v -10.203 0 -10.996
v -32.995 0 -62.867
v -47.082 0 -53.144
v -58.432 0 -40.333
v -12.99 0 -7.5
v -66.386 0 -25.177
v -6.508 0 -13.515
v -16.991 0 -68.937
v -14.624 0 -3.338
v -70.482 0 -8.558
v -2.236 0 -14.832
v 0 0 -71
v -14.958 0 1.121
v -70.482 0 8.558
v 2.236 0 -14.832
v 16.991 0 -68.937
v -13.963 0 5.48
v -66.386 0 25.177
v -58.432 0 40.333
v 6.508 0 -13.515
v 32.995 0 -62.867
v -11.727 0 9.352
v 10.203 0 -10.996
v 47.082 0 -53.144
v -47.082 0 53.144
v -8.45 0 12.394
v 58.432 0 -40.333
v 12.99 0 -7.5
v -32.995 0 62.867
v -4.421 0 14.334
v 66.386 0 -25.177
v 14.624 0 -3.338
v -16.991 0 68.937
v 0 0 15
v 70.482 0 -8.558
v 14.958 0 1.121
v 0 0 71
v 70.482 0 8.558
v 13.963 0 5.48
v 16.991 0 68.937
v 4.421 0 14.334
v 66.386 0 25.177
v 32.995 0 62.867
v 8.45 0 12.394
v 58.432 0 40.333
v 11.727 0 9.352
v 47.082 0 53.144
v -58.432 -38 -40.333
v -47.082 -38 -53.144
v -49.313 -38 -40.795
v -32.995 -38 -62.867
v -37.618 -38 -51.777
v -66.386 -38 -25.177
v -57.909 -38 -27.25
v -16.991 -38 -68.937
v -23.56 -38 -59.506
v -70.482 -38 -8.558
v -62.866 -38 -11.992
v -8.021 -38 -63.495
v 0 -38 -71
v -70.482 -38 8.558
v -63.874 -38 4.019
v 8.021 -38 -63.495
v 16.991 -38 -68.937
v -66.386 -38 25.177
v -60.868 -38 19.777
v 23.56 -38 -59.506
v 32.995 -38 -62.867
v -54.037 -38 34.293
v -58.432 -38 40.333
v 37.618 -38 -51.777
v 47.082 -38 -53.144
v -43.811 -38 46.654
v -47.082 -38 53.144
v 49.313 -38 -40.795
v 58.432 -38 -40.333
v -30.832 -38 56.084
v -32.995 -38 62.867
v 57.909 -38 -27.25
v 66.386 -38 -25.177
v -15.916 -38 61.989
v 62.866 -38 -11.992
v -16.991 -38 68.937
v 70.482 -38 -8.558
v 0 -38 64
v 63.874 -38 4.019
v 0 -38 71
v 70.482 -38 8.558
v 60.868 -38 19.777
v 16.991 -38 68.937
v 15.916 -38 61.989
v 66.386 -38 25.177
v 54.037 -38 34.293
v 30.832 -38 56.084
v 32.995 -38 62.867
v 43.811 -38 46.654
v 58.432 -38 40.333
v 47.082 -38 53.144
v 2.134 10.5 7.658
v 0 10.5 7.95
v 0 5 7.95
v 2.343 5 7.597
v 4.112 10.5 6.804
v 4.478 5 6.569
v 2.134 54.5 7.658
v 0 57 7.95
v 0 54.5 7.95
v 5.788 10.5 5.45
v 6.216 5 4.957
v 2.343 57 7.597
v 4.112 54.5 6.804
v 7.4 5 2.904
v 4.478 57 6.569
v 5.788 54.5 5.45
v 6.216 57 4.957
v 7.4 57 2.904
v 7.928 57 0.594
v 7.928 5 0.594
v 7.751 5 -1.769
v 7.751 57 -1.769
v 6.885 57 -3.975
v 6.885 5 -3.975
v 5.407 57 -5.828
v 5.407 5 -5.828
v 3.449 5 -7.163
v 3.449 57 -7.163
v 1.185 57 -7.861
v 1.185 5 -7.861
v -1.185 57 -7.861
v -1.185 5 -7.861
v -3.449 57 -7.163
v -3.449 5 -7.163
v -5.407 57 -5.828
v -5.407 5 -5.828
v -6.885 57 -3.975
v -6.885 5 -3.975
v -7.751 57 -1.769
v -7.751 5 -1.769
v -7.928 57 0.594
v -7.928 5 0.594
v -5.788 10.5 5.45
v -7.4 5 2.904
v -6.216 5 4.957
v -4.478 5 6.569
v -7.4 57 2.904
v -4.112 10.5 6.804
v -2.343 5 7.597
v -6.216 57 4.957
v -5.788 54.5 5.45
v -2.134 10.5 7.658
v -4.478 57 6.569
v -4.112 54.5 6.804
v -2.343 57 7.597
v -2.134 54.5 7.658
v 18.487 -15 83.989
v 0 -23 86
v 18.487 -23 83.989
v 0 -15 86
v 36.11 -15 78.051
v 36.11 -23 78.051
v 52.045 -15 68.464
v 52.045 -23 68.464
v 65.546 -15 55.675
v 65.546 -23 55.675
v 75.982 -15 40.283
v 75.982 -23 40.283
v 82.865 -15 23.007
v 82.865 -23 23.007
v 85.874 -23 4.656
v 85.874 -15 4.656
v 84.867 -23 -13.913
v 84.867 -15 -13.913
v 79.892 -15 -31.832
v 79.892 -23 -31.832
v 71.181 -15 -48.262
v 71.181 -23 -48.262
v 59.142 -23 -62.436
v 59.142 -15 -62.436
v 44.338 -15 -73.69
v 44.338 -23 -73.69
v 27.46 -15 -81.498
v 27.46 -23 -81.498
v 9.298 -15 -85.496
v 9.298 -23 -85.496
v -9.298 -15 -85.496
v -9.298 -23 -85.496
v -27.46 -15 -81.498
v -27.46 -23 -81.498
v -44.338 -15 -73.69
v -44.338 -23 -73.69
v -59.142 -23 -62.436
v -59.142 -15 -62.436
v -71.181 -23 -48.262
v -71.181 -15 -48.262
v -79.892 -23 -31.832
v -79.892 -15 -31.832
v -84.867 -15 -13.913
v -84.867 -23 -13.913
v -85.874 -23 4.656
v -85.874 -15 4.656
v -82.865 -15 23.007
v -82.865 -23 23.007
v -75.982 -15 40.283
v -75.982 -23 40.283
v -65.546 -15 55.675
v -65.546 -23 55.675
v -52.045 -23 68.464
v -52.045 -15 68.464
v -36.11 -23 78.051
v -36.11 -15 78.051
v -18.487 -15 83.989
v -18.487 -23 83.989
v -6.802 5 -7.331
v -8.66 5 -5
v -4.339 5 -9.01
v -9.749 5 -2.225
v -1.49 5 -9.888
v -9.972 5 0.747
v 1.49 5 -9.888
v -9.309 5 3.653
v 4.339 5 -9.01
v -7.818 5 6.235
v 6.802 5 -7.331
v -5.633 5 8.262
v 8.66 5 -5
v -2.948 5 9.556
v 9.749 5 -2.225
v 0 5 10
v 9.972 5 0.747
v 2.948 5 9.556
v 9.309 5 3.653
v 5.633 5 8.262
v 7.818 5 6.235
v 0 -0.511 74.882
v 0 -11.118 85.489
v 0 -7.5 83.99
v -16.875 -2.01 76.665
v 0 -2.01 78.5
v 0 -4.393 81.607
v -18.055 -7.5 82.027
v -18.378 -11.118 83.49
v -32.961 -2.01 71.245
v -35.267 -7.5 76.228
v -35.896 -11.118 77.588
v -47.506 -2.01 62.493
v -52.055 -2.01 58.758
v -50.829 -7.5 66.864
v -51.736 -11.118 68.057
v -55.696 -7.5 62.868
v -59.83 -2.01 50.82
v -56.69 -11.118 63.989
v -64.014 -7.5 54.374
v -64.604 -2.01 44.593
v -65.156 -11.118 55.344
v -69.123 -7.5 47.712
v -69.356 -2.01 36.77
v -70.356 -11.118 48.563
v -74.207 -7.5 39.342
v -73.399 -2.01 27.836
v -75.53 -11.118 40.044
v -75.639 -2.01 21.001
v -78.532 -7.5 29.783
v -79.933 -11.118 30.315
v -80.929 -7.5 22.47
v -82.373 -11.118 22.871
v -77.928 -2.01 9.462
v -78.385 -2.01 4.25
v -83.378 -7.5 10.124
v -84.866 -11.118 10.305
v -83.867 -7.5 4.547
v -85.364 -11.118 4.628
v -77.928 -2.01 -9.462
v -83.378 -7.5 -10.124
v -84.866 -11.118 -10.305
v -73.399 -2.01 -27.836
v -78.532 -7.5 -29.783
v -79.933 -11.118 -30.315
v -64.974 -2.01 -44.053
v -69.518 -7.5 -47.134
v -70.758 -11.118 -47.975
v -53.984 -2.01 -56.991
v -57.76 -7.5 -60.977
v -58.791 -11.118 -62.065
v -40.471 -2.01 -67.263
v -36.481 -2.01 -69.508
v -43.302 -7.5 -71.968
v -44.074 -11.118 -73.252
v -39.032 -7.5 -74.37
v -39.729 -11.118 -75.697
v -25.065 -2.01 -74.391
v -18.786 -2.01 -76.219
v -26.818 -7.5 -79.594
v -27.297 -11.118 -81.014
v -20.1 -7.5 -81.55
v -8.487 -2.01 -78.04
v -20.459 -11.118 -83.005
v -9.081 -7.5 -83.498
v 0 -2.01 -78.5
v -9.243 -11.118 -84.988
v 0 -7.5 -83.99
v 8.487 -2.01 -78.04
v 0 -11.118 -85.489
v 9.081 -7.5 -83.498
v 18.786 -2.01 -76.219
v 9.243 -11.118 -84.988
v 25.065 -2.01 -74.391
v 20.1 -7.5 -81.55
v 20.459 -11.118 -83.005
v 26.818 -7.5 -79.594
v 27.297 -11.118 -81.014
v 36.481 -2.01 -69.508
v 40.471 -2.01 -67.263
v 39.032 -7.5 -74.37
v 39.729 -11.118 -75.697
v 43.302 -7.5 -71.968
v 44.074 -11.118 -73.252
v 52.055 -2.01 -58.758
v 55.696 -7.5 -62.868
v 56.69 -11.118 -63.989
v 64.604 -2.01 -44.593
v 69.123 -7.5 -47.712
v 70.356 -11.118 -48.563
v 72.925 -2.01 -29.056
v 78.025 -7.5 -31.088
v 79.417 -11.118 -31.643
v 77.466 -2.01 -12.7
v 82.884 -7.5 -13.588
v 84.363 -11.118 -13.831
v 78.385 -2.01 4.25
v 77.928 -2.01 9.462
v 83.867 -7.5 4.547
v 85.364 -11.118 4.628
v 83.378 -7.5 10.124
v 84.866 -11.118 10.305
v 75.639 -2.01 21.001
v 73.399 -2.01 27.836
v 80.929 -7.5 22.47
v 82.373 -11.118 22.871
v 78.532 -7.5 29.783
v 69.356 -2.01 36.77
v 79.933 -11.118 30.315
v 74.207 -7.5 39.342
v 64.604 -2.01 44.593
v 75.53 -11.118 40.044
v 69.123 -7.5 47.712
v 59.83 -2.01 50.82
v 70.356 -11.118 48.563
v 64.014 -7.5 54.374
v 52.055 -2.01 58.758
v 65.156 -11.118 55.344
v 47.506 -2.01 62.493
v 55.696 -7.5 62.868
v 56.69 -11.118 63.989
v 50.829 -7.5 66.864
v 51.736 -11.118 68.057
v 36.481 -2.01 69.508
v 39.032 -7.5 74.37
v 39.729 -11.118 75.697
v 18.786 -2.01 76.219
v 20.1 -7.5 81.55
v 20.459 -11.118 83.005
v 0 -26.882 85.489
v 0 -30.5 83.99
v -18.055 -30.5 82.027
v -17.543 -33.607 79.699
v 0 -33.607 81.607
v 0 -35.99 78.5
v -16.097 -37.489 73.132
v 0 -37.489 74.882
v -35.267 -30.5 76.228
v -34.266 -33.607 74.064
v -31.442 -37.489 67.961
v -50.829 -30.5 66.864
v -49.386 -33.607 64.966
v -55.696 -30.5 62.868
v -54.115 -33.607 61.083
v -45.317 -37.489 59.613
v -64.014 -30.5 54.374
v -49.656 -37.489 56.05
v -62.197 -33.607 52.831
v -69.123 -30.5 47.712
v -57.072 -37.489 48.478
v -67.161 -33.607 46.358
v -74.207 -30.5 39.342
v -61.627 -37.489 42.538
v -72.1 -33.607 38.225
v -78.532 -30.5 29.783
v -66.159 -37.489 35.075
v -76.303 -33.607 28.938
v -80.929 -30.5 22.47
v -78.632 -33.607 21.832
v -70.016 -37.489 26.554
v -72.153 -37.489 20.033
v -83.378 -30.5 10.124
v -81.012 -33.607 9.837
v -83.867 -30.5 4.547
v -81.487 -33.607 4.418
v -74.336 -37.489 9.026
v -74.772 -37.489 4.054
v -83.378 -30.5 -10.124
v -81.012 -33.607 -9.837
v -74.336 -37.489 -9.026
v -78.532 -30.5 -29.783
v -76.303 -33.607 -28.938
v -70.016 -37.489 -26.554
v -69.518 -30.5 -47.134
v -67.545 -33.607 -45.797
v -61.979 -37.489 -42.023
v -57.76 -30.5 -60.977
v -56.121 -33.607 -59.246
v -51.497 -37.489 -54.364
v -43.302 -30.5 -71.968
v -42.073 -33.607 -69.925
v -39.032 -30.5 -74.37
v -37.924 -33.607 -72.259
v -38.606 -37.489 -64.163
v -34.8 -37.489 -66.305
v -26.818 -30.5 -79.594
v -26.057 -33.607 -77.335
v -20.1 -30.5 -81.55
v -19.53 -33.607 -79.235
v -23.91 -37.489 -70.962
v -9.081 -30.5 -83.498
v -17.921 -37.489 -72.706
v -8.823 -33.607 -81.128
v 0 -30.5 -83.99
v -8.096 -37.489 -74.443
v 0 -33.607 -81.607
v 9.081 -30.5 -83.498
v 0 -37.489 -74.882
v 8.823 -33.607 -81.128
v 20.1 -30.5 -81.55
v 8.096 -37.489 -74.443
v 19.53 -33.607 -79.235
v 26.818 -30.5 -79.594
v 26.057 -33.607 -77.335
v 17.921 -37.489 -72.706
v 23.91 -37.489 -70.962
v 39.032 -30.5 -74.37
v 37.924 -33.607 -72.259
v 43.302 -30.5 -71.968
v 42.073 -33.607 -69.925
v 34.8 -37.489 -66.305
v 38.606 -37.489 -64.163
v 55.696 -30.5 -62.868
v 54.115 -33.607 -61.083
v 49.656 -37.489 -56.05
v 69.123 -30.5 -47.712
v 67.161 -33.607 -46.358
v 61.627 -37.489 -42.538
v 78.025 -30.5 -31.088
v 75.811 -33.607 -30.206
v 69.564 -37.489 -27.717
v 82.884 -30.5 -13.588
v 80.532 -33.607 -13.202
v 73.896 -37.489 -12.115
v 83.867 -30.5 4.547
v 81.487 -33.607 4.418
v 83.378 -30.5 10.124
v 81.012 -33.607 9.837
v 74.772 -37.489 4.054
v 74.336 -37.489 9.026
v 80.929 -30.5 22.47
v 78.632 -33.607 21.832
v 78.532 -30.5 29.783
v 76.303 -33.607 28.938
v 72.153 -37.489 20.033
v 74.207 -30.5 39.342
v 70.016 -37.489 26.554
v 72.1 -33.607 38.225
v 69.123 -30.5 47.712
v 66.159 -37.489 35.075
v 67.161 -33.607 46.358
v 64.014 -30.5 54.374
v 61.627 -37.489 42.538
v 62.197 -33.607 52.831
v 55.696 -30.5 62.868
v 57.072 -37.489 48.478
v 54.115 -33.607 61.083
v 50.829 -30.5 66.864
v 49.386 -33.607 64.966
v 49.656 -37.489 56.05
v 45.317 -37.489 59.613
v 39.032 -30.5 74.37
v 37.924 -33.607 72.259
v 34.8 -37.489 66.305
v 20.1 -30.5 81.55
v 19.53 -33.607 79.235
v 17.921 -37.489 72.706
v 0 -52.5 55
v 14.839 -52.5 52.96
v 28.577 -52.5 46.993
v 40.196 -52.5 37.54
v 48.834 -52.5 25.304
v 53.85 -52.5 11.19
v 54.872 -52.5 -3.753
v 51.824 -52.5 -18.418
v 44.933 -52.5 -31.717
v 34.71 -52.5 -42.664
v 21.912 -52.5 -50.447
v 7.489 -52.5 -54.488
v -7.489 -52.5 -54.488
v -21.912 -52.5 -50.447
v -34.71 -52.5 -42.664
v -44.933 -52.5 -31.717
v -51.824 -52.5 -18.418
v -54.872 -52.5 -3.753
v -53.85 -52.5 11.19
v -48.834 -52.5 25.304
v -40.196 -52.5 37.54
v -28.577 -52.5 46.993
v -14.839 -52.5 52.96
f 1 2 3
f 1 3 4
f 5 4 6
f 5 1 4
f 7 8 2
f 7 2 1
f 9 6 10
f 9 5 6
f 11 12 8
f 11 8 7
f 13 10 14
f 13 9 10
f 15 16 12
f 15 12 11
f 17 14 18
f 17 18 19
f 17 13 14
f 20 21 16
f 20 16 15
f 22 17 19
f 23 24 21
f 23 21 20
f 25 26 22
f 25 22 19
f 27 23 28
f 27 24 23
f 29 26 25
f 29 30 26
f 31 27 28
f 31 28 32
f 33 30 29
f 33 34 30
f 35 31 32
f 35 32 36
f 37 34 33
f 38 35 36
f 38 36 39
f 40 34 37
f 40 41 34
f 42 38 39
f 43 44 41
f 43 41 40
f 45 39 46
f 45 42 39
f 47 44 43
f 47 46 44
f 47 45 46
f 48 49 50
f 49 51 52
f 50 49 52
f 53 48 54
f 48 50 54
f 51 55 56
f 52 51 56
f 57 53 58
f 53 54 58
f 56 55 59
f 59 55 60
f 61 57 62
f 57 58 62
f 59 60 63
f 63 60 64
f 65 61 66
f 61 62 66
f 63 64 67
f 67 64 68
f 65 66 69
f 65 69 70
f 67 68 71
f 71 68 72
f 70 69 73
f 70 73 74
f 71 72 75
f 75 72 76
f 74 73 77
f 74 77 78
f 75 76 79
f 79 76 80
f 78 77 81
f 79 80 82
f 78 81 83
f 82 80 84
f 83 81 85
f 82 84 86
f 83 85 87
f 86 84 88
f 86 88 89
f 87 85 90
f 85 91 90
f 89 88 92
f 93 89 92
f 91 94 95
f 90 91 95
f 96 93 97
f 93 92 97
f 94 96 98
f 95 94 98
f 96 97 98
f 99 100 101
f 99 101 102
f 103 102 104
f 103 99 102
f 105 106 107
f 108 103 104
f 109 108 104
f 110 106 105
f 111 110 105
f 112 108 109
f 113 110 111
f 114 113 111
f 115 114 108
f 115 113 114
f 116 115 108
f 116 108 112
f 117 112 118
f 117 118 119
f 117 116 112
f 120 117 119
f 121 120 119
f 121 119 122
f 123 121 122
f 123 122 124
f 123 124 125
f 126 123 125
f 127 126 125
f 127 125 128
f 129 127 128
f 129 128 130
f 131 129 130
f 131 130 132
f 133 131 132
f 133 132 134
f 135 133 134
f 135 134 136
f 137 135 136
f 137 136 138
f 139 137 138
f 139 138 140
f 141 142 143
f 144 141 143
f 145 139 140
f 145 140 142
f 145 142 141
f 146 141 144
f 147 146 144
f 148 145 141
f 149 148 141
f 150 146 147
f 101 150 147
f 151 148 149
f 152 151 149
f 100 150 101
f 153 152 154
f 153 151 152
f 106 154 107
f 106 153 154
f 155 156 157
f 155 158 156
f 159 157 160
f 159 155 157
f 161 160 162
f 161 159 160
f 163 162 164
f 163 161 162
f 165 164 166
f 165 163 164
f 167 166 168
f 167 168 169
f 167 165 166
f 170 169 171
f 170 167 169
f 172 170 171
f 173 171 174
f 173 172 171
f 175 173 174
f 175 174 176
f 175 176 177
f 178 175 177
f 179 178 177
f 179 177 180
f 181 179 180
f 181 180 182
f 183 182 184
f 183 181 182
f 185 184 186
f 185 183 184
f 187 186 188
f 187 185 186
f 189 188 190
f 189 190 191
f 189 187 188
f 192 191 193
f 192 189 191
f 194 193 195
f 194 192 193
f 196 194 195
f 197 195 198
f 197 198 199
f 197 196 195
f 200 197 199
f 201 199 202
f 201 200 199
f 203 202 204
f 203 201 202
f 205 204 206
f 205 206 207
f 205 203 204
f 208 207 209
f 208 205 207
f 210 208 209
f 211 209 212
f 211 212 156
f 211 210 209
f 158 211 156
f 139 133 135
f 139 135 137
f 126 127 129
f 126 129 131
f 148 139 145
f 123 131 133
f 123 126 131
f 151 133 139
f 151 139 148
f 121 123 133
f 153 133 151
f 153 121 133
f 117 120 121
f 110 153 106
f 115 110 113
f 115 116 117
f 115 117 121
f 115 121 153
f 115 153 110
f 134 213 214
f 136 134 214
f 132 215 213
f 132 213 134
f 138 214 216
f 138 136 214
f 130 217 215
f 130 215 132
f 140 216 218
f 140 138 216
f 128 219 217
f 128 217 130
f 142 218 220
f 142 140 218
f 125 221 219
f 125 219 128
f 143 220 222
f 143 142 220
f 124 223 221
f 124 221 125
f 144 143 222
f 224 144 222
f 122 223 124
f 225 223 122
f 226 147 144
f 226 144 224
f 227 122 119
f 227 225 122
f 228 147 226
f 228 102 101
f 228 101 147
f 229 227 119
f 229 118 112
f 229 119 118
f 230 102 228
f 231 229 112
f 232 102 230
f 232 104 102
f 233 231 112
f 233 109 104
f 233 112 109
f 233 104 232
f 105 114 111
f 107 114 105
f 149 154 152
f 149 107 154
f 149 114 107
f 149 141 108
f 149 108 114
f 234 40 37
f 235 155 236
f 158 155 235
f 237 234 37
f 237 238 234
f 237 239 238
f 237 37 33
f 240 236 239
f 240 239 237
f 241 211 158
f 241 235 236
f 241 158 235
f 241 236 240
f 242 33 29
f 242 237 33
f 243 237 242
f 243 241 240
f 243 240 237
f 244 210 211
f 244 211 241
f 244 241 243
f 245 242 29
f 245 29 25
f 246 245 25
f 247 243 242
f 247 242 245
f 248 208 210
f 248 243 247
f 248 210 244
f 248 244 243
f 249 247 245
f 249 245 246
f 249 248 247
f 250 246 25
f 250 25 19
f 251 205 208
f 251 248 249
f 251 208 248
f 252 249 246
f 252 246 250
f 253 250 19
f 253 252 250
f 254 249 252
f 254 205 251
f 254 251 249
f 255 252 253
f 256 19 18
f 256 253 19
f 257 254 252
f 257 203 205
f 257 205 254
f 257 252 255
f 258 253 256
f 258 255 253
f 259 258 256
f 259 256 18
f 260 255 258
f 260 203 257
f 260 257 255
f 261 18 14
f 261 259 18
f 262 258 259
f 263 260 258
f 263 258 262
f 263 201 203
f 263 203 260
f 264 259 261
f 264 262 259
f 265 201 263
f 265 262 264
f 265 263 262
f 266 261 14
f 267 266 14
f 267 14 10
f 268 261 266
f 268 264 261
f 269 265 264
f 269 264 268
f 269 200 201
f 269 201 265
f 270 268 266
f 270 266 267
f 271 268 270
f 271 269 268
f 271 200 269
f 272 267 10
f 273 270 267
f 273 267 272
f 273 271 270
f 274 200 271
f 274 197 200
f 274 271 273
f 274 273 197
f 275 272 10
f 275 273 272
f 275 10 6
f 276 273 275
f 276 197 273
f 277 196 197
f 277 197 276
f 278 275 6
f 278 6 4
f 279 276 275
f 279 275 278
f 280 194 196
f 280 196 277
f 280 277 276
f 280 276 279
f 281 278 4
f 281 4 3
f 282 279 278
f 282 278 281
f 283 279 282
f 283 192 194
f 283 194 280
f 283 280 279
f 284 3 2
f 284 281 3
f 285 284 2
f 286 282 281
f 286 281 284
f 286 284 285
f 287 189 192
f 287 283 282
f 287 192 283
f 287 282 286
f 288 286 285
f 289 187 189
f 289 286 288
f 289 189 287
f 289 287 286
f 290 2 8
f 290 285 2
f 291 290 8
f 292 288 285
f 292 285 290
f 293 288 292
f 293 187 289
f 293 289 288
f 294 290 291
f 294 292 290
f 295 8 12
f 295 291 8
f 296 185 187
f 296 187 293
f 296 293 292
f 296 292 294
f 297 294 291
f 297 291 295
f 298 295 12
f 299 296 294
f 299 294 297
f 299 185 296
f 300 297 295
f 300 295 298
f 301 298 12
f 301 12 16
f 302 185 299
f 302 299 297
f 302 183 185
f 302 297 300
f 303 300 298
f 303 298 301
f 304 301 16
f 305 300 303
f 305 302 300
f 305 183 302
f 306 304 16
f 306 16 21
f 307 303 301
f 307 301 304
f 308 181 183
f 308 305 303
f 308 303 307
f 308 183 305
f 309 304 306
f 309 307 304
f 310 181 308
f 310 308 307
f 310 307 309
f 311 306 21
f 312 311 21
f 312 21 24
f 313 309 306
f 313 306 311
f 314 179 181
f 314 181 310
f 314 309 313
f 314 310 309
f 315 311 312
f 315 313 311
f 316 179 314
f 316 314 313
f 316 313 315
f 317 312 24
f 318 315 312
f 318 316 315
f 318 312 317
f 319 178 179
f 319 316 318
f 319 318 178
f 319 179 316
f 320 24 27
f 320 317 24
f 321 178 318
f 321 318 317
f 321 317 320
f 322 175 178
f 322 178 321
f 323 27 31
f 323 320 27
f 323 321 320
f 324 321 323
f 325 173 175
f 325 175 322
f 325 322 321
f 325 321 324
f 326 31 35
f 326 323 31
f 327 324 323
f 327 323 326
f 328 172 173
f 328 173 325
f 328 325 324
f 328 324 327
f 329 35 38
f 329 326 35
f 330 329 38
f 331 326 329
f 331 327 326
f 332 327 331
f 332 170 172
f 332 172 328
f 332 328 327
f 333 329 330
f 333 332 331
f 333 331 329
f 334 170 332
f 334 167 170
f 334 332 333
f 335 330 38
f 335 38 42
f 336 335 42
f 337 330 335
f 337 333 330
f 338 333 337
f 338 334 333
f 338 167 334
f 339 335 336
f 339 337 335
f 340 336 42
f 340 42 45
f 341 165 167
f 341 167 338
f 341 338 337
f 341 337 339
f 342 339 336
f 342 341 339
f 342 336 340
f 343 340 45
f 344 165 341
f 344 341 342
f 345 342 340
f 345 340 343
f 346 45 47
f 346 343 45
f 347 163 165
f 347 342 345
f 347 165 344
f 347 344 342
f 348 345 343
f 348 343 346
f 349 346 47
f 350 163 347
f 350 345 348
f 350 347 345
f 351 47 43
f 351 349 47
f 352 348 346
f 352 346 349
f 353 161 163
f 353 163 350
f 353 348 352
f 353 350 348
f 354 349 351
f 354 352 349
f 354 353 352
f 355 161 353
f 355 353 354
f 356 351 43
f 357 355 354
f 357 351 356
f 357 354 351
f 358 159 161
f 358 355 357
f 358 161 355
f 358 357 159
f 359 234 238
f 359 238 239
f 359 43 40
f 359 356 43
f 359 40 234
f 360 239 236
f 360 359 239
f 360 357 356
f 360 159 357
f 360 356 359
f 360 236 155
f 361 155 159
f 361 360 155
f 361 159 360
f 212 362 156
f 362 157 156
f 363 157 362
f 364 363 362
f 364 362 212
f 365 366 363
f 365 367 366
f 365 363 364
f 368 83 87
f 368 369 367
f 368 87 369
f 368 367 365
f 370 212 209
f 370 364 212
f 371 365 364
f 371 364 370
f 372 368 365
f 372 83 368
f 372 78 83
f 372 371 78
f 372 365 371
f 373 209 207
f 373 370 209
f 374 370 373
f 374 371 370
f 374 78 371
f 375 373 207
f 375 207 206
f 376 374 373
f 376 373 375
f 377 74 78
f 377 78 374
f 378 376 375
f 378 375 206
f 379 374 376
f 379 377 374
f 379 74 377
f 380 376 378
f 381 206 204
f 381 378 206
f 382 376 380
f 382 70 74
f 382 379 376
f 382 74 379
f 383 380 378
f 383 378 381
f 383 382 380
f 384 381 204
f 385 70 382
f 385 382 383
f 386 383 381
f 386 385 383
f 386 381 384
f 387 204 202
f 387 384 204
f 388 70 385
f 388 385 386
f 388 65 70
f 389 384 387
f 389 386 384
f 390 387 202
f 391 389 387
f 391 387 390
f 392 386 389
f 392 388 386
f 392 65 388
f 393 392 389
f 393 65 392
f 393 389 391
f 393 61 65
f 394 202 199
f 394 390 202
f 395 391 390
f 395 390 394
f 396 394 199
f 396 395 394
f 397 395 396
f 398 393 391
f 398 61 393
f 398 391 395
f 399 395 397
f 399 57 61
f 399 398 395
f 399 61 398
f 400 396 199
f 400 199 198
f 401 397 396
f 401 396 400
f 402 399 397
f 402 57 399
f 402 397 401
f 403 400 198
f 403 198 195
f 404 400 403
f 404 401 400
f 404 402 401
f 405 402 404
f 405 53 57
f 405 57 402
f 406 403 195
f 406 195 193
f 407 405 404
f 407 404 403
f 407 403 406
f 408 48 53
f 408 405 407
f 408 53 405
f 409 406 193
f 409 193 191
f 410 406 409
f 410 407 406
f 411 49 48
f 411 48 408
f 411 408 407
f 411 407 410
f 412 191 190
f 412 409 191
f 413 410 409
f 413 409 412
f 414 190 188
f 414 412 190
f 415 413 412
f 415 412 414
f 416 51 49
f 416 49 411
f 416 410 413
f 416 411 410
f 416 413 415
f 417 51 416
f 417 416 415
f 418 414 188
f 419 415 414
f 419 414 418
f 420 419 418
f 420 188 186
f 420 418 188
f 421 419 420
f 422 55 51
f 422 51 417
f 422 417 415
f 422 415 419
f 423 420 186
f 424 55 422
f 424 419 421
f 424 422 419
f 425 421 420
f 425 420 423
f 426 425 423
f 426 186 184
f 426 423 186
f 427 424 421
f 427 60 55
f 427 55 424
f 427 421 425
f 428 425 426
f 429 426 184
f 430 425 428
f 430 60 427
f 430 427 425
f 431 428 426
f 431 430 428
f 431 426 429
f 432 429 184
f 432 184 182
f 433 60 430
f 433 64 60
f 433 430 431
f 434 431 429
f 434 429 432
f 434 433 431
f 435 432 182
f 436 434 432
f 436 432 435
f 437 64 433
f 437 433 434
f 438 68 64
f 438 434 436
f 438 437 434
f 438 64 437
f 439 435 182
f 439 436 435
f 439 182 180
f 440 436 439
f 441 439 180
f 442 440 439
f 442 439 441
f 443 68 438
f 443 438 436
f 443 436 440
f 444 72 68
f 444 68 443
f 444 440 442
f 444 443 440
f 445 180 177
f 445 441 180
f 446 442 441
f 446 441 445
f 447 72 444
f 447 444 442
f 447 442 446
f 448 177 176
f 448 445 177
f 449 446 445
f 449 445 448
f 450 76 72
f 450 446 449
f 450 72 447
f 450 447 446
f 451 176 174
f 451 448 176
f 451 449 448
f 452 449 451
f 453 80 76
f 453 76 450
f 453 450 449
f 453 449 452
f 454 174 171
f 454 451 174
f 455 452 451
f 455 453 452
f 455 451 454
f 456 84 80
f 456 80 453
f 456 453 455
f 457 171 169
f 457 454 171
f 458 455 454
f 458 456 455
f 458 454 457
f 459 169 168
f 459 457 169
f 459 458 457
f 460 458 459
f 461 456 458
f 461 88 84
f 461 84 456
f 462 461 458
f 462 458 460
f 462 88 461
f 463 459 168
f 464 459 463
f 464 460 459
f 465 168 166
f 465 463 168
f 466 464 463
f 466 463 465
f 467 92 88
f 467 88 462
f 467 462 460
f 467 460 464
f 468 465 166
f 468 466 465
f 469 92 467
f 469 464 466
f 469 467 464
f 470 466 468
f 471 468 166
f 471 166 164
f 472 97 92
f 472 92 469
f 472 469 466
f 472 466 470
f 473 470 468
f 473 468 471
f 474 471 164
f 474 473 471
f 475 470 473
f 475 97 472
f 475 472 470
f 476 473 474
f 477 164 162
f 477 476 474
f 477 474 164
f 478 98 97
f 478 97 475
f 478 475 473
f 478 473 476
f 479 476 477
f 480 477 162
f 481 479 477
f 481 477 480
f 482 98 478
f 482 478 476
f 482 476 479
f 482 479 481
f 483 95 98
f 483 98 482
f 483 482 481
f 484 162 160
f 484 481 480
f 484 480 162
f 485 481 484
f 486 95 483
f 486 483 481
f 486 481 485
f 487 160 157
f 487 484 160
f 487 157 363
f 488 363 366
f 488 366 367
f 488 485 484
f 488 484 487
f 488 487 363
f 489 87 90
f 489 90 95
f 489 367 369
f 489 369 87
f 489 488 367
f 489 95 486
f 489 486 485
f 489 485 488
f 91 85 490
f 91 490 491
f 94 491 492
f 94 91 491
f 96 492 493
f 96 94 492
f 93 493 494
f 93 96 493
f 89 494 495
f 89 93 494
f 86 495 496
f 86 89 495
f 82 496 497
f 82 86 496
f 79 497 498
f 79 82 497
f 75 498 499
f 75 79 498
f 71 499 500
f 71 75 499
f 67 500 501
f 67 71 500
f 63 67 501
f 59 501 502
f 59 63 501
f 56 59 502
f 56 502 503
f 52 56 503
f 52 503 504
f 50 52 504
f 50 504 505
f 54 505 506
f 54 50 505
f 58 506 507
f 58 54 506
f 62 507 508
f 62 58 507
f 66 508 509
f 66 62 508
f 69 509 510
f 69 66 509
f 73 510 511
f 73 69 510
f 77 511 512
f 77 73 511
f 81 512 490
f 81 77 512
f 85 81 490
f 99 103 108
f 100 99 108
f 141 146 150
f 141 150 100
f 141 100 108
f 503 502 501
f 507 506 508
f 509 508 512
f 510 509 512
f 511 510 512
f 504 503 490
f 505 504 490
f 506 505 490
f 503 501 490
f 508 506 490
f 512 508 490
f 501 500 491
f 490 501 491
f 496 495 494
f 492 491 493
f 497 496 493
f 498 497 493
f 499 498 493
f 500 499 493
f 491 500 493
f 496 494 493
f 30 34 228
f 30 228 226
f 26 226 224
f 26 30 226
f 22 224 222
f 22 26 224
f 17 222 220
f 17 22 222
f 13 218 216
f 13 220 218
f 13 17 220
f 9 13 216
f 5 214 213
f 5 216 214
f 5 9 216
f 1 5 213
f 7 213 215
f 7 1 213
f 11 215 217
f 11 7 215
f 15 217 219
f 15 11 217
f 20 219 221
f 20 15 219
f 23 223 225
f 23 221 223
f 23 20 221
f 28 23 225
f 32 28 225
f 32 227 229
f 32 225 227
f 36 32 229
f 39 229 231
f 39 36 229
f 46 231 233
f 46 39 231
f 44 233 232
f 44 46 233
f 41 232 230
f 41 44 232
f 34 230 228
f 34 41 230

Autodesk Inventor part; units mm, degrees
ref_plane "YZ Plane" through (0, 0, 0) normal (1, 0, 0) x (0, 1, 0)
ref_plane "XZ Plane" through (0, 0, 0) normal (0, 1, 0) x (-1, 0, 0)
ref_plane "XY Plane" through (0, 0, 0) normal (0, 0, 1) x (1, 0, 0)
sketch "Sketch1" plane through (0, 0, 0) normal (1, 0, 0) x (0, 1, 0)
  line L0 (0, 83.4) -> (0, -13.9) construction
  line L1 (-74.4, 0) -> (78.9, 0) construction
  line L2 (0, 69.5) -> (-38, 69.5)
  line L3 (-38, 69.5) -> (-38, 64)
  line L4 (-52.5, 55) -> (-52.5, 0)
  line L5 (-52.5, 55) -> (-38, 64)
  line L6 (-52.5, 0) -> (0, 0)
  line L7 (0, 69.5) -> (0, 15)
  line L8 (0, 15) -> (5, 10)
  line L9 (5, 10) -> (5, 7.95)
  line L10 (5, 7.95) -> (57, 7.95)
  line L11 (57, 7.95) -> (57, 0)
  line L12 (57, 0) -> (0, 0)
  dimension "d1" = 139
  dimension "d2" = 110
  dimension "d3" = 128
  dimension "d4" = 52.5
  dimension "d6" = 14.5
  dimension "d7" = 20
  dimension "d8" = 135
  dimension "d9" = 5
  dimension "d10" = 15.9
  dimension "d11" = 57
revolve "Base" add sketch "Sketch1" angle 360 about axis through (0, 0, 0) along (0, 1, 0)
sketch "Sketch2" plane through (0, 0, 0) normal (1, 0, 0) x (0, 1, 0)
  line L0 (5, 7.95) -> (57, 7.95) construction
  line L1 (5, -10) -> (5, 10) construction
  line L2 (57, -7.95) -> (57, 7.95) construction
  line L3 (10.5, 7.95) -> (10.5, 5.45)
  line L4 (10.5, 5.45) -> (54.5, 5.45)
  line L5 (54.5, 5.45) -> (54.5, 7.95)
  line L6 (5, -7.95) -> (57, -7.95) construction
  line L7 (10.5, 7.95) -> (54.5, 7.95)
  point P0 (0, 0)
  dimension "d13" = 13.4
  dimension "d14" = 5.5
  dimension "d15" = 2.5
  dimension "d16" = 44
extrude "Cut" cut sketch "Sketch2" along normal through all both and the other way through all
sketch "Sketch3" plane through (0, 0, 0) normal (1, 0, 0) x (0, 1, 0)
  line L0 (-38, 69.5) -> (0, 69.5) construction
  line L1 (-74.4, 0) -> (78.9, 0) construction
  line L2 (0, 97.3) -> (0, -97.3) construction
  line L3 (-38, -69.5) -> (-38, 69.5) construction
  line L4 (0, -69.5) -> (0, 69.5) projected
  line L5 (0, 69.5) -> (-38, 69.5)
  line L6 (-23, 86) -> (-15, 86)
  line L7 (-38, 69.5) -> (-38, 71)
  line L8 (0, 69.5) -> (0, 71)
  arc A0 (-23, 86) -> (-38, 71) centre (-23, 71) ccw
  arc A1 (0, 71) -> (-15, 86) centre (-15, 71) ccw
  point P0 (0, 0)
  point P1 (-38, 86)
  point P2 (0, 86)
  dimension "d21" = 172
  dimension "d22" = 15
revolve "Revolution2" add sketch "Sketch3" angle 360 about axis through (0, 0, 0) along (0, 1, 0)
properties part number "10-001-ACTR" material "Aluminum 6061"
